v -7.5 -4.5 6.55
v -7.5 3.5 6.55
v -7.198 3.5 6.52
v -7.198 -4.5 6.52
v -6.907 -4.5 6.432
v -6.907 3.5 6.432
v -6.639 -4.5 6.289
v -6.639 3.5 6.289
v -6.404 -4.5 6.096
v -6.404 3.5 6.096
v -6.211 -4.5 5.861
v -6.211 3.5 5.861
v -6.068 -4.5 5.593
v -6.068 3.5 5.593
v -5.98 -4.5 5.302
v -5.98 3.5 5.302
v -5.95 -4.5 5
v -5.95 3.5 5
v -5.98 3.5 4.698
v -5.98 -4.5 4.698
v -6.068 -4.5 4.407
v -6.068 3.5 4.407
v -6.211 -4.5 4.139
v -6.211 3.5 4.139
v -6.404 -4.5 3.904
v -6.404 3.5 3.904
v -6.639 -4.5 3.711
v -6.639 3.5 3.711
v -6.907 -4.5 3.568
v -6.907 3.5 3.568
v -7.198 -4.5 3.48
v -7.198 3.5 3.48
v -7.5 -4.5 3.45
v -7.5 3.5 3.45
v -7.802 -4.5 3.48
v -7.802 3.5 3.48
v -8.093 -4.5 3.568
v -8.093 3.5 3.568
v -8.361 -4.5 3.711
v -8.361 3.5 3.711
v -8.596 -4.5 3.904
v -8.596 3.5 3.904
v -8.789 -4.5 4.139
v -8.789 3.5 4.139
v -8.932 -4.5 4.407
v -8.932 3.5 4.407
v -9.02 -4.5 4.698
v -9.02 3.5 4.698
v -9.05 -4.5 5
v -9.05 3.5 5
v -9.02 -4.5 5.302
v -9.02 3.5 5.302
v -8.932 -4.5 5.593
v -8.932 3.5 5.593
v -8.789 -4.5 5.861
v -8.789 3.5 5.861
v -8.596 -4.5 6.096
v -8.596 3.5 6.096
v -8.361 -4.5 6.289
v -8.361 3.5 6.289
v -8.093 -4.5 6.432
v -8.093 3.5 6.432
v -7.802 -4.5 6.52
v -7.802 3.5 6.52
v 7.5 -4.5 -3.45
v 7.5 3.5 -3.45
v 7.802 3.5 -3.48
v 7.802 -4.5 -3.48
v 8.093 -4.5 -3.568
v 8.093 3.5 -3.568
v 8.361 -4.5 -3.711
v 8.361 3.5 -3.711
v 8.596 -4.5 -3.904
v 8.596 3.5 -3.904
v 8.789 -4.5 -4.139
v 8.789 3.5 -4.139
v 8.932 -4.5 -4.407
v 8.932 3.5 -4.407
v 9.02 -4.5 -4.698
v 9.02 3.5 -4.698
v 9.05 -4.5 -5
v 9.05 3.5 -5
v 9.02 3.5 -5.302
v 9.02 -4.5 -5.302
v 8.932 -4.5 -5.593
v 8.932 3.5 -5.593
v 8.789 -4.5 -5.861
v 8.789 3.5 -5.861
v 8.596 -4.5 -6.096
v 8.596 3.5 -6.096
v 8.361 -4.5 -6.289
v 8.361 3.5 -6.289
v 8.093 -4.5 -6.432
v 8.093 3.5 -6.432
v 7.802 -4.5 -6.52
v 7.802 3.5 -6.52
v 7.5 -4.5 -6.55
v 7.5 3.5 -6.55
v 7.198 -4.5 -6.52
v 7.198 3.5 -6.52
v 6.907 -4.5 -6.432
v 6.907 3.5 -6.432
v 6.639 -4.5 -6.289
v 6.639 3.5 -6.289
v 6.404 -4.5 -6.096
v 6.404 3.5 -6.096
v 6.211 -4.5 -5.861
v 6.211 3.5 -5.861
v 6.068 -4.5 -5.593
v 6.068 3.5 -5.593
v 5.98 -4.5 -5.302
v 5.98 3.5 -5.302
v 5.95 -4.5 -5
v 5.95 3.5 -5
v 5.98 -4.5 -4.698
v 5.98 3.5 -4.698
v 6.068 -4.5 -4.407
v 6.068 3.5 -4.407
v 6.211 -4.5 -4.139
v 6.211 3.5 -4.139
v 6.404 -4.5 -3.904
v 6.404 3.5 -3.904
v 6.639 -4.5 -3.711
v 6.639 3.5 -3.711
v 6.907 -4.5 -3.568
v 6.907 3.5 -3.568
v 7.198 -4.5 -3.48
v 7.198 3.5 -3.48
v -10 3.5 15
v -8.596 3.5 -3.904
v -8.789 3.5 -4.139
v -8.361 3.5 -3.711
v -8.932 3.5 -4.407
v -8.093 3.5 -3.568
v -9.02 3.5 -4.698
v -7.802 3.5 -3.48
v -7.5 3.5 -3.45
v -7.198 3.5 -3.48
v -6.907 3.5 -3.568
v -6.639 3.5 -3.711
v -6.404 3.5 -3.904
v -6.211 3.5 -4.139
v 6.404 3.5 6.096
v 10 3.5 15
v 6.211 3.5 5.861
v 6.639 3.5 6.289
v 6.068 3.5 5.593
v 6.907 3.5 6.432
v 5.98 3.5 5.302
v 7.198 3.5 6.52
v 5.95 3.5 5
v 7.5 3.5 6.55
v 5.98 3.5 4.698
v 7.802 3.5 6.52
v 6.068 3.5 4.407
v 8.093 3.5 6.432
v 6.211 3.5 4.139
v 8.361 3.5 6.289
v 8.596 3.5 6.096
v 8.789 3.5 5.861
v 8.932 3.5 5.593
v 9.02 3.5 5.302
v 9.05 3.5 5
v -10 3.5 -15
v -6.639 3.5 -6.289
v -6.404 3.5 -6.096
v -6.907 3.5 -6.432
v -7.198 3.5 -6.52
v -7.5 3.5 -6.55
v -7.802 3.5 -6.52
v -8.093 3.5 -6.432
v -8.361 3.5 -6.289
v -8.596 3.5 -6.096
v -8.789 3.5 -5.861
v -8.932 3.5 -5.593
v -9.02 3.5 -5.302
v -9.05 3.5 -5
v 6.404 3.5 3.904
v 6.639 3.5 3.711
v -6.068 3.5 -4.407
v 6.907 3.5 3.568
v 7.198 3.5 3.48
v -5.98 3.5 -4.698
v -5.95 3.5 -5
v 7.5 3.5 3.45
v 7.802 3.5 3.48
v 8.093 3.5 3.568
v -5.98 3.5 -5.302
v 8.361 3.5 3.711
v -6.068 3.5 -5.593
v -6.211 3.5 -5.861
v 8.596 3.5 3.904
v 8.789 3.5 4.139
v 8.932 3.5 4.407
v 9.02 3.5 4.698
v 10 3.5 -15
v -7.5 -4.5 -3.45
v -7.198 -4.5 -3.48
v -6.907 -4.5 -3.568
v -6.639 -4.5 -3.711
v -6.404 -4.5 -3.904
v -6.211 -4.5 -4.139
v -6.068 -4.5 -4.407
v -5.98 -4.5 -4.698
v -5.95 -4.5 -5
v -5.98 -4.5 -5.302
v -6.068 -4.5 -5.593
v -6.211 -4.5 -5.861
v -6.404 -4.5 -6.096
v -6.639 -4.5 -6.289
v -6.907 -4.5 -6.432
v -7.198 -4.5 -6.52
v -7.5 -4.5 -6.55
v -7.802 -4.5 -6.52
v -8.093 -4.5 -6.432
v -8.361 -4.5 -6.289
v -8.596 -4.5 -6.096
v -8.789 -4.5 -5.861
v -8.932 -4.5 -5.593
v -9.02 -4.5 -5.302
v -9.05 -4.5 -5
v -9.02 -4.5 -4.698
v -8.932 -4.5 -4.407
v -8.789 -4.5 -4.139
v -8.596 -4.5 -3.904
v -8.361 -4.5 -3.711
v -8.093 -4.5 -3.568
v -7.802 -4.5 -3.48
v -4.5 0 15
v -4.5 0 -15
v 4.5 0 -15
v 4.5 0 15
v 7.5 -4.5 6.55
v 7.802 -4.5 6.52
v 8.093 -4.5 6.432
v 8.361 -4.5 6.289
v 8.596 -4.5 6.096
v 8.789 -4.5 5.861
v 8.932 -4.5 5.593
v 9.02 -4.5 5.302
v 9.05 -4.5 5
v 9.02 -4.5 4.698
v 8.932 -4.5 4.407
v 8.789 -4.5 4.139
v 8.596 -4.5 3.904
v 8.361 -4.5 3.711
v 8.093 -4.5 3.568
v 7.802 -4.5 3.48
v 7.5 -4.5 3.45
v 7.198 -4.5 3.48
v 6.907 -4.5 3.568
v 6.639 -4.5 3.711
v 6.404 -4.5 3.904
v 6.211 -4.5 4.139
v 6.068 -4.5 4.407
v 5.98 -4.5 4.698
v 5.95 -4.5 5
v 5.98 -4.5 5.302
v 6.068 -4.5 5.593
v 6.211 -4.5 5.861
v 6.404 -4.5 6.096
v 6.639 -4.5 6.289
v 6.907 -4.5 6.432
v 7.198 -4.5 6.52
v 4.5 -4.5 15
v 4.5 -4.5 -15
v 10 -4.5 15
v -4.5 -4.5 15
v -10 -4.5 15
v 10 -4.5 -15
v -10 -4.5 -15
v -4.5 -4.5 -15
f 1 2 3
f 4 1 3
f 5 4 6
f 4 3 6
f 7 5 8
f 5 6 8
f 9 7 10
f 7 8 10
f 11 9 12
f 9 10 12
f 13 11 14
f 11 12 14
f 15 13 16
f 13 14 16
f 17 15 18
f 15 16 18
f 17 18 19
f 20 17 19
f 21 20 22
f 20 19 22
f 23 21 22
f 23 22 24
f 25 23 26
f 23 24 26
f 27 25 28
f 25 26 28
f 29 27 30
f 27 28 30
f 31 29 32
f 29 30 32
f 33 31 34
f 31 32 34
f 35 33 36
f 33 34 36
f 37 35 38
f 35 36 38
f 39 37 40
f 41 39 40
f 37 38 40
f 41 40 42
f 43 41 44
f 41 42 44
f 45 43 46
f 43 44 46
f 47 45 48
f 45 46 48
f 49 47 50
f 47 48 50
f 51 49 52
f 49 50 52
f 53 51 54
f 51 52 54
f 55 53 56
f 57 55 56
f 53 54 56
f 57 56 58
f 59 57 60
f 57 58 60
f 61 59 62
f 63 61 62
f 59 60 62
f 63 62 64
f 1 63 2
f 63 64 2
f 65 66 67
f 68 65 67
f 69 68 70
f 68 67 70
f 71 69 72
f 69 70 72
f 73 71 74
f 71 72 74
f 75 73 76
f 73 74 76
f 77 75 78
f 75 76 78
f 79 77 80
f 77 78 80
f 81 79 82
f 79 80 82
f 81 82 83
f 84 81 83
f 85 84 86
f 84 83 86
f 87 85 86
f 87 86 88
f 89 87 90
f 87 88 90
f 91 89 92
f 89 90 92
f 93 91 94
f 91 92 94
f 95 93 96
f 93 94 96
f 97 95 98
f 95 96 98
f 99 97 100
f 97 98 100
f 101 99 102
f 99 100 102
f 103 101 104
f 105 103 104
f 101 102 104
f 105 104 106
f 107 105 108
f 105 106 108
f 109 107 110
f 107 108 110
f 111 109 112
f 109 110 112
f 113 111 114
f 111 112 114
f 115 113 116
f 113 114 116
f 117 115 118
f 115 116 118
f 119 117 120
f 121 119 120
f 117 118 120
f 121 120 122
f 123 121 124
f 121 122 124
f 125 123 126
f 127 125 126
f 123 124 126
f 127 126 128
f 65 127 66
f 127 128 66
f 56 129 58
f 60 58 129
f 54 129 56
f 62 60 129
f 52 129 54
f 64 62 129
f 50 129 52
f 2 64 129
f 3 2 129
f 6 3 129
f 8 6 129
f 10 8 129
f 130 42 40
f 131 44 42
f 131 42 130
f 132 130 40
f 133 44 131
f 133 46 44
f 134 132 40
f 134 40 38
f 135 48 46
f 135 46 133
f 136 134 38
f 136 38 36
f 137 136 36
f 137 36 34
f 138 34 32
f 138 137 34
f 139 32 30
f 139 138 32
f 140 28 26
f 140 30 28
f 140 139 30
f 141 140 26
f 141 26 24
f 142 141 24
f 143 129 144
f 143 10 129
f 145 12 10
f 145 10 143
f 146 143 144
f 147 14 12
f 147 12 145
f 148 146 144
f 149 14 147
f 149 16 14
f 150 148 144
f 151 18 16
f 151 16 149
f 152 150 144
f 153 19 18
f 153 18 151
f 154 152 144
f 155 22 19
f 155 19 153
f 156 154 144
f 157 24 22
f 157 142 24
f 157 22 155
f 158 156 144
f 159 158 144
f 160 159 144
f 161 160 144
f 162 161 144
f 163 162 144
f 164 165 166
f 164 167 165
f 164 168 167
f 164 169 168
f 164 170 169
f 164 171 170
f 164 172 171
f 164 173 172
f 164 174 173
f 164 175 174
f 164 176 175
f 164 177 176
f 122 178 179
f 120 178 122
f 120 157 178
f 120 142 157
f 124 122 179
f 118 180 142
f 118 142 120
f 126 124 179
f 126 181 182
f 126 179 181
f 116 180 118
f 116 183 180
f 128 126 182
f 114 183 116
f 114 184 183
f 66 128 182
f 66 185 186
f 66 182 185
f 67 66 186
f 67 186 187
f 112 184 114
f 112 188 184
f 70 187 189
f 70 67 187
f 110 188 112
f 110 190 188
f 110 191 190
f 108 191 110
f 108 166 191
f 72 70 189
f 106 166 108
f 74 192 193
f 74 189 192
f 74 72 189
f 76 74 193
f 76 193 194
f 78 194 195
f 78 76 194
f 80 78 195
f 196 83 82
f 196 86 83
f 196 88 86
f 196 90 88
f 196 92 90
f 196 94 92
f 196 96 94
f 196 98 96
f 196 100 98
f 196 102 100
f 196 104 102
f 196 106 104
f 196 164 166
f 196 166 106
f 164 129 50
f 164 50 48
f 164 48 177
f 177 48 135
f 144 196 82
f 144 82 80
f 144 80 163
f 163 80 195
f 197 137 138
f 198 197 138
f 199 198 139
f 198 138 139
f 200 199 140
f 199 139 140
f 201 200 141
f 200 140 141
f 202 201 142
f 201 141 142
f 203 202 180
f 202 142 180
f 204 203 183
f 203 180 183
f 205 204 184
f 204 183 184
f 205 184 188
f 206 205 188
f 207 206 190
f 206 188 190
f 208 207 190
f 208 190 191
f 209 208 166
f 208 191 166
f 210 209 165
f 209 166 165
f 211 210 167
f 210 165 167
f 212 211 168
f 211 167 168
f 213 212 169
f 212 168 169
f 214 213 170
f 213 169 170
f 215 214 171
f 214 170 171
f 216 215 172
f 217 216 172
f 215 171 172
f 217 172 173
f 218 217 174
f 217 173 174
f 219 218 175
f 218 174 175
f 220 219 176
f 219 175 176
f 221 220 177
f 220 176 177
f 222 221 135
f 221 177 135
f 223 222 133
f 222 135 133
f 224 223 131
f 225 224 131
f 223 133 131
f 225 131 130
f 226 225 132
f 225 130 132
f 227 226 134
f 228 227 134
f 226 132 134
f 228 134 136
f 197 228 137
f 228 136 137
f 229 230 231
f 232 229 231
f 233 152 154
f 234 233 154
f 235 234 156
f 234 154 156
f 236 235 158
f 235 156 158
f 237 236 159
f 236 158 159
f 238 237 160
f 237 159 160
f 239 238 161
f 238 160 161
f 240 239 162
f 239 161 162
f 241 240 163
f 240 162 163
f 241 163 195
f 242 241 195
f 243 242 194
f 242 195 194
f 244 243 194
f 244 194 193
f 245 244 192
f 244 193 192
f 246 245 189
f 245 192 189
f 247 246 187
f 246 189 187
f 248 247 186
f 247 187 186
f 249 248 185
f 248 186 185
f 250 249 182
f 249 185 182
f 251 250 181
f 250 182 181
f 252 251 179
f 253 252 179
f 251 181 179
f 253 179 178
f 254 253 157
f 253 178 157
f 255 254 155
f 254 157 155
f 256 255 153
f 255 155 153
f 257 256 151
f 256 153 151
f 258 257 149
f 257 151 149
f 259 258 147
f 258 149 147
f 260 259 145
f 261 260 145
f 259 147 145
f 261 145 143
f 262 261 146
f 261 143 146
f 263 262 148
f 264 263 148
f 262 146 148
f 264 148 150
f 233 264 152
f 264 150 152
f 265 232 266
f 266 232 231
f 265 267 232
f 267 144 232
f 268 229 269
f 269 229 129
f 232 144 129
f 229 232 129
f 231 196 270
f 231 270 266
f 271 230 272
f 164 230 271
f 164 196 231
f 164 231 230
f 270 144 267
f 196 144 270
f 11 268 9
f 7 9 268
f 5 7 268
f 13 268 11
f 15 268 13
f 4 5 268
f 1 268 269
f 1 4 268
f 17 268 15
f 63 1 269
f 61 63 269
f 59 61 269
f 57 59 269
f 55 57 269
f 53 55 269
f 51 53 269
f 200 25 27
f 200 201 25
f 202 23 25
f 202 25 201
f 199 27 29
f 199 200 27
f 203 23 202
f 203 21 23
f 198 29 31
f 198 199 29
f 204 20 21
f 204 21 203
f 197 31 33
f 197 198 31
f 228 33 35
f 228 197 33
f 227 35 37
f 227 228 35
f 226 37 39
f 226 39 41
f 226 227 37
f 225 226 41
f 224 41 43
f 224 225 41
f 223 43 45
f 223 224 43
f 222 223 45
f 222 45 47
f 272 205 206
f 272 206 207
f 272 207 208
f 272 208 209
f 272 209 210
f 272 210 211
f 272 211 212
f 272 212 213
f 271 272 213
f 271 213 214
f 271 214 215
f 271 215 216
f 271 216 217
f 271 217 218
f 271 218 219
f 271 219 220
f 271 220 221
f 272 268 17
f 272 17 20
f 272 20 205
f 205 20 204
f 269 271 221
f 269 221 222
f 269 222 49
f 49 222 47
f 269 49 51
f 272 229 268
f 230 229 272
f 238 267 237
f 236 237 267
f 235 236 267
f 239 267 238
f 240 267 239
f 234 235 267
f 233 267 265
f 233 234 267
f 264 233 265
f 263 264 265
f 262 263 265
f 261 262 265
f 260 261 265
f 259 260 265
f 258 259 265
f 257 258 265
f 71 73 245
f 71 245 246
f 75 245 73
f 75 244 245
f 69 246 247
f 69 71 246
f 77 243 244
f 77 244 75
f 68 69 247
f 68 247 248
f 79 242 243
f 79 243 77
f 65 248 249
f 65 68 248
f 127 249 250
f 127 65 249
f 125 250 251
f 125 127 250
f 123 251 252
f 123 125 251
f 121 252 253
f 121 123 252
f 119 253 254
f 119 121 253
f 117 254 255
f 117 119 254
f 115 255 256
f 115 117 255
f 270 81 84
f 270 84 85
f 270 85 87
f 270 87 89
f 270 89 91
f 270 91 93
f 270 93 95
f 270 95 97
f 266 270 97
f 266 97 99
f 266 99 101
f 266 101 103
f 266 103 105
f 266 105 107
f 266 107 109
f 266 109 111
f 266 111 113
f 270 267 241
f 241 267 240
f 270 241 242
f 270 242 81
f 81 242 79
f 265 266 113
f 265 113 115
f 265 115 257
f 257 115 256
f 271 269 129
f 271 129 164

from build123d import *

# Parameters (mm, degrees)
SKETCH_1_W          = 20
SKETCH_1_H          = 30
EXTRUDE_1_DEPTH     = 3.5
SKETCH_2_W          = 5.5
SKETCH_2_H          = 30
EXTRUDE_2_DEPTH     = 4.5
SKETCH_3_R          = 1.55
CUT_EXTRUDE_1_DEPTH = 8


with BuildPart() as part:
    # 草图1 → 凸台-拉伸1 (new body)
    with BuildSketch(Plane(origin=(0, 0, 0), x_dir=(1, 0, 0), z_dir=(0, 1, 0))):
        Rectangle(SKETCH_1_W, SKETCH_1_H)
    extrude(amount=EXTRUDE_1_DEPTH)

    # 草图2 → 凸台-拉伸2 (add)
    with BuildSketch(Plane(origin=(0, 0, 0), x_dir=(-1, 0, 0), z_dir=(0, -1, 0))):
        with Locations((-7.25, 0)):
            Rectangle(SKETCH_2_W, SKETCH_2_H)
        with Locations((7.25, 0)):
            Rectangle(SKETCH_2_W, SKETCH_2_H)
    extrude(amount=EXTRUDE_2_DEPTH)

    # 草图3 → 切除-拉伸1 (cut)
    with BuildSketch(Plane(origin=(0, 3.5, 0), x_dir=(1, 0, 0), z_dir=(0, 1, 0))):
        with Locations(Location((-7.5, -5, 0), (0, 0, 270))):
            Circle(SKETCH_3_R)
        with Locations(Location((-7.5, 5, 0), (0, 0, 270))):
            Circle(SKETCH_3_R)
        with Locations(Location((7.5, 5, 0), (0, 0, 270))):
            Circle(SKETCH_3_R)
        with Locations(Location((7.5, -5, 0), (0, 0, 270))):
            Circle(SKETCH_3_R)
    extrude(amount=-CUT_EXTRUDE_1_DEPTH, mode=Mode.SUBTRACT)


solid = part.part
